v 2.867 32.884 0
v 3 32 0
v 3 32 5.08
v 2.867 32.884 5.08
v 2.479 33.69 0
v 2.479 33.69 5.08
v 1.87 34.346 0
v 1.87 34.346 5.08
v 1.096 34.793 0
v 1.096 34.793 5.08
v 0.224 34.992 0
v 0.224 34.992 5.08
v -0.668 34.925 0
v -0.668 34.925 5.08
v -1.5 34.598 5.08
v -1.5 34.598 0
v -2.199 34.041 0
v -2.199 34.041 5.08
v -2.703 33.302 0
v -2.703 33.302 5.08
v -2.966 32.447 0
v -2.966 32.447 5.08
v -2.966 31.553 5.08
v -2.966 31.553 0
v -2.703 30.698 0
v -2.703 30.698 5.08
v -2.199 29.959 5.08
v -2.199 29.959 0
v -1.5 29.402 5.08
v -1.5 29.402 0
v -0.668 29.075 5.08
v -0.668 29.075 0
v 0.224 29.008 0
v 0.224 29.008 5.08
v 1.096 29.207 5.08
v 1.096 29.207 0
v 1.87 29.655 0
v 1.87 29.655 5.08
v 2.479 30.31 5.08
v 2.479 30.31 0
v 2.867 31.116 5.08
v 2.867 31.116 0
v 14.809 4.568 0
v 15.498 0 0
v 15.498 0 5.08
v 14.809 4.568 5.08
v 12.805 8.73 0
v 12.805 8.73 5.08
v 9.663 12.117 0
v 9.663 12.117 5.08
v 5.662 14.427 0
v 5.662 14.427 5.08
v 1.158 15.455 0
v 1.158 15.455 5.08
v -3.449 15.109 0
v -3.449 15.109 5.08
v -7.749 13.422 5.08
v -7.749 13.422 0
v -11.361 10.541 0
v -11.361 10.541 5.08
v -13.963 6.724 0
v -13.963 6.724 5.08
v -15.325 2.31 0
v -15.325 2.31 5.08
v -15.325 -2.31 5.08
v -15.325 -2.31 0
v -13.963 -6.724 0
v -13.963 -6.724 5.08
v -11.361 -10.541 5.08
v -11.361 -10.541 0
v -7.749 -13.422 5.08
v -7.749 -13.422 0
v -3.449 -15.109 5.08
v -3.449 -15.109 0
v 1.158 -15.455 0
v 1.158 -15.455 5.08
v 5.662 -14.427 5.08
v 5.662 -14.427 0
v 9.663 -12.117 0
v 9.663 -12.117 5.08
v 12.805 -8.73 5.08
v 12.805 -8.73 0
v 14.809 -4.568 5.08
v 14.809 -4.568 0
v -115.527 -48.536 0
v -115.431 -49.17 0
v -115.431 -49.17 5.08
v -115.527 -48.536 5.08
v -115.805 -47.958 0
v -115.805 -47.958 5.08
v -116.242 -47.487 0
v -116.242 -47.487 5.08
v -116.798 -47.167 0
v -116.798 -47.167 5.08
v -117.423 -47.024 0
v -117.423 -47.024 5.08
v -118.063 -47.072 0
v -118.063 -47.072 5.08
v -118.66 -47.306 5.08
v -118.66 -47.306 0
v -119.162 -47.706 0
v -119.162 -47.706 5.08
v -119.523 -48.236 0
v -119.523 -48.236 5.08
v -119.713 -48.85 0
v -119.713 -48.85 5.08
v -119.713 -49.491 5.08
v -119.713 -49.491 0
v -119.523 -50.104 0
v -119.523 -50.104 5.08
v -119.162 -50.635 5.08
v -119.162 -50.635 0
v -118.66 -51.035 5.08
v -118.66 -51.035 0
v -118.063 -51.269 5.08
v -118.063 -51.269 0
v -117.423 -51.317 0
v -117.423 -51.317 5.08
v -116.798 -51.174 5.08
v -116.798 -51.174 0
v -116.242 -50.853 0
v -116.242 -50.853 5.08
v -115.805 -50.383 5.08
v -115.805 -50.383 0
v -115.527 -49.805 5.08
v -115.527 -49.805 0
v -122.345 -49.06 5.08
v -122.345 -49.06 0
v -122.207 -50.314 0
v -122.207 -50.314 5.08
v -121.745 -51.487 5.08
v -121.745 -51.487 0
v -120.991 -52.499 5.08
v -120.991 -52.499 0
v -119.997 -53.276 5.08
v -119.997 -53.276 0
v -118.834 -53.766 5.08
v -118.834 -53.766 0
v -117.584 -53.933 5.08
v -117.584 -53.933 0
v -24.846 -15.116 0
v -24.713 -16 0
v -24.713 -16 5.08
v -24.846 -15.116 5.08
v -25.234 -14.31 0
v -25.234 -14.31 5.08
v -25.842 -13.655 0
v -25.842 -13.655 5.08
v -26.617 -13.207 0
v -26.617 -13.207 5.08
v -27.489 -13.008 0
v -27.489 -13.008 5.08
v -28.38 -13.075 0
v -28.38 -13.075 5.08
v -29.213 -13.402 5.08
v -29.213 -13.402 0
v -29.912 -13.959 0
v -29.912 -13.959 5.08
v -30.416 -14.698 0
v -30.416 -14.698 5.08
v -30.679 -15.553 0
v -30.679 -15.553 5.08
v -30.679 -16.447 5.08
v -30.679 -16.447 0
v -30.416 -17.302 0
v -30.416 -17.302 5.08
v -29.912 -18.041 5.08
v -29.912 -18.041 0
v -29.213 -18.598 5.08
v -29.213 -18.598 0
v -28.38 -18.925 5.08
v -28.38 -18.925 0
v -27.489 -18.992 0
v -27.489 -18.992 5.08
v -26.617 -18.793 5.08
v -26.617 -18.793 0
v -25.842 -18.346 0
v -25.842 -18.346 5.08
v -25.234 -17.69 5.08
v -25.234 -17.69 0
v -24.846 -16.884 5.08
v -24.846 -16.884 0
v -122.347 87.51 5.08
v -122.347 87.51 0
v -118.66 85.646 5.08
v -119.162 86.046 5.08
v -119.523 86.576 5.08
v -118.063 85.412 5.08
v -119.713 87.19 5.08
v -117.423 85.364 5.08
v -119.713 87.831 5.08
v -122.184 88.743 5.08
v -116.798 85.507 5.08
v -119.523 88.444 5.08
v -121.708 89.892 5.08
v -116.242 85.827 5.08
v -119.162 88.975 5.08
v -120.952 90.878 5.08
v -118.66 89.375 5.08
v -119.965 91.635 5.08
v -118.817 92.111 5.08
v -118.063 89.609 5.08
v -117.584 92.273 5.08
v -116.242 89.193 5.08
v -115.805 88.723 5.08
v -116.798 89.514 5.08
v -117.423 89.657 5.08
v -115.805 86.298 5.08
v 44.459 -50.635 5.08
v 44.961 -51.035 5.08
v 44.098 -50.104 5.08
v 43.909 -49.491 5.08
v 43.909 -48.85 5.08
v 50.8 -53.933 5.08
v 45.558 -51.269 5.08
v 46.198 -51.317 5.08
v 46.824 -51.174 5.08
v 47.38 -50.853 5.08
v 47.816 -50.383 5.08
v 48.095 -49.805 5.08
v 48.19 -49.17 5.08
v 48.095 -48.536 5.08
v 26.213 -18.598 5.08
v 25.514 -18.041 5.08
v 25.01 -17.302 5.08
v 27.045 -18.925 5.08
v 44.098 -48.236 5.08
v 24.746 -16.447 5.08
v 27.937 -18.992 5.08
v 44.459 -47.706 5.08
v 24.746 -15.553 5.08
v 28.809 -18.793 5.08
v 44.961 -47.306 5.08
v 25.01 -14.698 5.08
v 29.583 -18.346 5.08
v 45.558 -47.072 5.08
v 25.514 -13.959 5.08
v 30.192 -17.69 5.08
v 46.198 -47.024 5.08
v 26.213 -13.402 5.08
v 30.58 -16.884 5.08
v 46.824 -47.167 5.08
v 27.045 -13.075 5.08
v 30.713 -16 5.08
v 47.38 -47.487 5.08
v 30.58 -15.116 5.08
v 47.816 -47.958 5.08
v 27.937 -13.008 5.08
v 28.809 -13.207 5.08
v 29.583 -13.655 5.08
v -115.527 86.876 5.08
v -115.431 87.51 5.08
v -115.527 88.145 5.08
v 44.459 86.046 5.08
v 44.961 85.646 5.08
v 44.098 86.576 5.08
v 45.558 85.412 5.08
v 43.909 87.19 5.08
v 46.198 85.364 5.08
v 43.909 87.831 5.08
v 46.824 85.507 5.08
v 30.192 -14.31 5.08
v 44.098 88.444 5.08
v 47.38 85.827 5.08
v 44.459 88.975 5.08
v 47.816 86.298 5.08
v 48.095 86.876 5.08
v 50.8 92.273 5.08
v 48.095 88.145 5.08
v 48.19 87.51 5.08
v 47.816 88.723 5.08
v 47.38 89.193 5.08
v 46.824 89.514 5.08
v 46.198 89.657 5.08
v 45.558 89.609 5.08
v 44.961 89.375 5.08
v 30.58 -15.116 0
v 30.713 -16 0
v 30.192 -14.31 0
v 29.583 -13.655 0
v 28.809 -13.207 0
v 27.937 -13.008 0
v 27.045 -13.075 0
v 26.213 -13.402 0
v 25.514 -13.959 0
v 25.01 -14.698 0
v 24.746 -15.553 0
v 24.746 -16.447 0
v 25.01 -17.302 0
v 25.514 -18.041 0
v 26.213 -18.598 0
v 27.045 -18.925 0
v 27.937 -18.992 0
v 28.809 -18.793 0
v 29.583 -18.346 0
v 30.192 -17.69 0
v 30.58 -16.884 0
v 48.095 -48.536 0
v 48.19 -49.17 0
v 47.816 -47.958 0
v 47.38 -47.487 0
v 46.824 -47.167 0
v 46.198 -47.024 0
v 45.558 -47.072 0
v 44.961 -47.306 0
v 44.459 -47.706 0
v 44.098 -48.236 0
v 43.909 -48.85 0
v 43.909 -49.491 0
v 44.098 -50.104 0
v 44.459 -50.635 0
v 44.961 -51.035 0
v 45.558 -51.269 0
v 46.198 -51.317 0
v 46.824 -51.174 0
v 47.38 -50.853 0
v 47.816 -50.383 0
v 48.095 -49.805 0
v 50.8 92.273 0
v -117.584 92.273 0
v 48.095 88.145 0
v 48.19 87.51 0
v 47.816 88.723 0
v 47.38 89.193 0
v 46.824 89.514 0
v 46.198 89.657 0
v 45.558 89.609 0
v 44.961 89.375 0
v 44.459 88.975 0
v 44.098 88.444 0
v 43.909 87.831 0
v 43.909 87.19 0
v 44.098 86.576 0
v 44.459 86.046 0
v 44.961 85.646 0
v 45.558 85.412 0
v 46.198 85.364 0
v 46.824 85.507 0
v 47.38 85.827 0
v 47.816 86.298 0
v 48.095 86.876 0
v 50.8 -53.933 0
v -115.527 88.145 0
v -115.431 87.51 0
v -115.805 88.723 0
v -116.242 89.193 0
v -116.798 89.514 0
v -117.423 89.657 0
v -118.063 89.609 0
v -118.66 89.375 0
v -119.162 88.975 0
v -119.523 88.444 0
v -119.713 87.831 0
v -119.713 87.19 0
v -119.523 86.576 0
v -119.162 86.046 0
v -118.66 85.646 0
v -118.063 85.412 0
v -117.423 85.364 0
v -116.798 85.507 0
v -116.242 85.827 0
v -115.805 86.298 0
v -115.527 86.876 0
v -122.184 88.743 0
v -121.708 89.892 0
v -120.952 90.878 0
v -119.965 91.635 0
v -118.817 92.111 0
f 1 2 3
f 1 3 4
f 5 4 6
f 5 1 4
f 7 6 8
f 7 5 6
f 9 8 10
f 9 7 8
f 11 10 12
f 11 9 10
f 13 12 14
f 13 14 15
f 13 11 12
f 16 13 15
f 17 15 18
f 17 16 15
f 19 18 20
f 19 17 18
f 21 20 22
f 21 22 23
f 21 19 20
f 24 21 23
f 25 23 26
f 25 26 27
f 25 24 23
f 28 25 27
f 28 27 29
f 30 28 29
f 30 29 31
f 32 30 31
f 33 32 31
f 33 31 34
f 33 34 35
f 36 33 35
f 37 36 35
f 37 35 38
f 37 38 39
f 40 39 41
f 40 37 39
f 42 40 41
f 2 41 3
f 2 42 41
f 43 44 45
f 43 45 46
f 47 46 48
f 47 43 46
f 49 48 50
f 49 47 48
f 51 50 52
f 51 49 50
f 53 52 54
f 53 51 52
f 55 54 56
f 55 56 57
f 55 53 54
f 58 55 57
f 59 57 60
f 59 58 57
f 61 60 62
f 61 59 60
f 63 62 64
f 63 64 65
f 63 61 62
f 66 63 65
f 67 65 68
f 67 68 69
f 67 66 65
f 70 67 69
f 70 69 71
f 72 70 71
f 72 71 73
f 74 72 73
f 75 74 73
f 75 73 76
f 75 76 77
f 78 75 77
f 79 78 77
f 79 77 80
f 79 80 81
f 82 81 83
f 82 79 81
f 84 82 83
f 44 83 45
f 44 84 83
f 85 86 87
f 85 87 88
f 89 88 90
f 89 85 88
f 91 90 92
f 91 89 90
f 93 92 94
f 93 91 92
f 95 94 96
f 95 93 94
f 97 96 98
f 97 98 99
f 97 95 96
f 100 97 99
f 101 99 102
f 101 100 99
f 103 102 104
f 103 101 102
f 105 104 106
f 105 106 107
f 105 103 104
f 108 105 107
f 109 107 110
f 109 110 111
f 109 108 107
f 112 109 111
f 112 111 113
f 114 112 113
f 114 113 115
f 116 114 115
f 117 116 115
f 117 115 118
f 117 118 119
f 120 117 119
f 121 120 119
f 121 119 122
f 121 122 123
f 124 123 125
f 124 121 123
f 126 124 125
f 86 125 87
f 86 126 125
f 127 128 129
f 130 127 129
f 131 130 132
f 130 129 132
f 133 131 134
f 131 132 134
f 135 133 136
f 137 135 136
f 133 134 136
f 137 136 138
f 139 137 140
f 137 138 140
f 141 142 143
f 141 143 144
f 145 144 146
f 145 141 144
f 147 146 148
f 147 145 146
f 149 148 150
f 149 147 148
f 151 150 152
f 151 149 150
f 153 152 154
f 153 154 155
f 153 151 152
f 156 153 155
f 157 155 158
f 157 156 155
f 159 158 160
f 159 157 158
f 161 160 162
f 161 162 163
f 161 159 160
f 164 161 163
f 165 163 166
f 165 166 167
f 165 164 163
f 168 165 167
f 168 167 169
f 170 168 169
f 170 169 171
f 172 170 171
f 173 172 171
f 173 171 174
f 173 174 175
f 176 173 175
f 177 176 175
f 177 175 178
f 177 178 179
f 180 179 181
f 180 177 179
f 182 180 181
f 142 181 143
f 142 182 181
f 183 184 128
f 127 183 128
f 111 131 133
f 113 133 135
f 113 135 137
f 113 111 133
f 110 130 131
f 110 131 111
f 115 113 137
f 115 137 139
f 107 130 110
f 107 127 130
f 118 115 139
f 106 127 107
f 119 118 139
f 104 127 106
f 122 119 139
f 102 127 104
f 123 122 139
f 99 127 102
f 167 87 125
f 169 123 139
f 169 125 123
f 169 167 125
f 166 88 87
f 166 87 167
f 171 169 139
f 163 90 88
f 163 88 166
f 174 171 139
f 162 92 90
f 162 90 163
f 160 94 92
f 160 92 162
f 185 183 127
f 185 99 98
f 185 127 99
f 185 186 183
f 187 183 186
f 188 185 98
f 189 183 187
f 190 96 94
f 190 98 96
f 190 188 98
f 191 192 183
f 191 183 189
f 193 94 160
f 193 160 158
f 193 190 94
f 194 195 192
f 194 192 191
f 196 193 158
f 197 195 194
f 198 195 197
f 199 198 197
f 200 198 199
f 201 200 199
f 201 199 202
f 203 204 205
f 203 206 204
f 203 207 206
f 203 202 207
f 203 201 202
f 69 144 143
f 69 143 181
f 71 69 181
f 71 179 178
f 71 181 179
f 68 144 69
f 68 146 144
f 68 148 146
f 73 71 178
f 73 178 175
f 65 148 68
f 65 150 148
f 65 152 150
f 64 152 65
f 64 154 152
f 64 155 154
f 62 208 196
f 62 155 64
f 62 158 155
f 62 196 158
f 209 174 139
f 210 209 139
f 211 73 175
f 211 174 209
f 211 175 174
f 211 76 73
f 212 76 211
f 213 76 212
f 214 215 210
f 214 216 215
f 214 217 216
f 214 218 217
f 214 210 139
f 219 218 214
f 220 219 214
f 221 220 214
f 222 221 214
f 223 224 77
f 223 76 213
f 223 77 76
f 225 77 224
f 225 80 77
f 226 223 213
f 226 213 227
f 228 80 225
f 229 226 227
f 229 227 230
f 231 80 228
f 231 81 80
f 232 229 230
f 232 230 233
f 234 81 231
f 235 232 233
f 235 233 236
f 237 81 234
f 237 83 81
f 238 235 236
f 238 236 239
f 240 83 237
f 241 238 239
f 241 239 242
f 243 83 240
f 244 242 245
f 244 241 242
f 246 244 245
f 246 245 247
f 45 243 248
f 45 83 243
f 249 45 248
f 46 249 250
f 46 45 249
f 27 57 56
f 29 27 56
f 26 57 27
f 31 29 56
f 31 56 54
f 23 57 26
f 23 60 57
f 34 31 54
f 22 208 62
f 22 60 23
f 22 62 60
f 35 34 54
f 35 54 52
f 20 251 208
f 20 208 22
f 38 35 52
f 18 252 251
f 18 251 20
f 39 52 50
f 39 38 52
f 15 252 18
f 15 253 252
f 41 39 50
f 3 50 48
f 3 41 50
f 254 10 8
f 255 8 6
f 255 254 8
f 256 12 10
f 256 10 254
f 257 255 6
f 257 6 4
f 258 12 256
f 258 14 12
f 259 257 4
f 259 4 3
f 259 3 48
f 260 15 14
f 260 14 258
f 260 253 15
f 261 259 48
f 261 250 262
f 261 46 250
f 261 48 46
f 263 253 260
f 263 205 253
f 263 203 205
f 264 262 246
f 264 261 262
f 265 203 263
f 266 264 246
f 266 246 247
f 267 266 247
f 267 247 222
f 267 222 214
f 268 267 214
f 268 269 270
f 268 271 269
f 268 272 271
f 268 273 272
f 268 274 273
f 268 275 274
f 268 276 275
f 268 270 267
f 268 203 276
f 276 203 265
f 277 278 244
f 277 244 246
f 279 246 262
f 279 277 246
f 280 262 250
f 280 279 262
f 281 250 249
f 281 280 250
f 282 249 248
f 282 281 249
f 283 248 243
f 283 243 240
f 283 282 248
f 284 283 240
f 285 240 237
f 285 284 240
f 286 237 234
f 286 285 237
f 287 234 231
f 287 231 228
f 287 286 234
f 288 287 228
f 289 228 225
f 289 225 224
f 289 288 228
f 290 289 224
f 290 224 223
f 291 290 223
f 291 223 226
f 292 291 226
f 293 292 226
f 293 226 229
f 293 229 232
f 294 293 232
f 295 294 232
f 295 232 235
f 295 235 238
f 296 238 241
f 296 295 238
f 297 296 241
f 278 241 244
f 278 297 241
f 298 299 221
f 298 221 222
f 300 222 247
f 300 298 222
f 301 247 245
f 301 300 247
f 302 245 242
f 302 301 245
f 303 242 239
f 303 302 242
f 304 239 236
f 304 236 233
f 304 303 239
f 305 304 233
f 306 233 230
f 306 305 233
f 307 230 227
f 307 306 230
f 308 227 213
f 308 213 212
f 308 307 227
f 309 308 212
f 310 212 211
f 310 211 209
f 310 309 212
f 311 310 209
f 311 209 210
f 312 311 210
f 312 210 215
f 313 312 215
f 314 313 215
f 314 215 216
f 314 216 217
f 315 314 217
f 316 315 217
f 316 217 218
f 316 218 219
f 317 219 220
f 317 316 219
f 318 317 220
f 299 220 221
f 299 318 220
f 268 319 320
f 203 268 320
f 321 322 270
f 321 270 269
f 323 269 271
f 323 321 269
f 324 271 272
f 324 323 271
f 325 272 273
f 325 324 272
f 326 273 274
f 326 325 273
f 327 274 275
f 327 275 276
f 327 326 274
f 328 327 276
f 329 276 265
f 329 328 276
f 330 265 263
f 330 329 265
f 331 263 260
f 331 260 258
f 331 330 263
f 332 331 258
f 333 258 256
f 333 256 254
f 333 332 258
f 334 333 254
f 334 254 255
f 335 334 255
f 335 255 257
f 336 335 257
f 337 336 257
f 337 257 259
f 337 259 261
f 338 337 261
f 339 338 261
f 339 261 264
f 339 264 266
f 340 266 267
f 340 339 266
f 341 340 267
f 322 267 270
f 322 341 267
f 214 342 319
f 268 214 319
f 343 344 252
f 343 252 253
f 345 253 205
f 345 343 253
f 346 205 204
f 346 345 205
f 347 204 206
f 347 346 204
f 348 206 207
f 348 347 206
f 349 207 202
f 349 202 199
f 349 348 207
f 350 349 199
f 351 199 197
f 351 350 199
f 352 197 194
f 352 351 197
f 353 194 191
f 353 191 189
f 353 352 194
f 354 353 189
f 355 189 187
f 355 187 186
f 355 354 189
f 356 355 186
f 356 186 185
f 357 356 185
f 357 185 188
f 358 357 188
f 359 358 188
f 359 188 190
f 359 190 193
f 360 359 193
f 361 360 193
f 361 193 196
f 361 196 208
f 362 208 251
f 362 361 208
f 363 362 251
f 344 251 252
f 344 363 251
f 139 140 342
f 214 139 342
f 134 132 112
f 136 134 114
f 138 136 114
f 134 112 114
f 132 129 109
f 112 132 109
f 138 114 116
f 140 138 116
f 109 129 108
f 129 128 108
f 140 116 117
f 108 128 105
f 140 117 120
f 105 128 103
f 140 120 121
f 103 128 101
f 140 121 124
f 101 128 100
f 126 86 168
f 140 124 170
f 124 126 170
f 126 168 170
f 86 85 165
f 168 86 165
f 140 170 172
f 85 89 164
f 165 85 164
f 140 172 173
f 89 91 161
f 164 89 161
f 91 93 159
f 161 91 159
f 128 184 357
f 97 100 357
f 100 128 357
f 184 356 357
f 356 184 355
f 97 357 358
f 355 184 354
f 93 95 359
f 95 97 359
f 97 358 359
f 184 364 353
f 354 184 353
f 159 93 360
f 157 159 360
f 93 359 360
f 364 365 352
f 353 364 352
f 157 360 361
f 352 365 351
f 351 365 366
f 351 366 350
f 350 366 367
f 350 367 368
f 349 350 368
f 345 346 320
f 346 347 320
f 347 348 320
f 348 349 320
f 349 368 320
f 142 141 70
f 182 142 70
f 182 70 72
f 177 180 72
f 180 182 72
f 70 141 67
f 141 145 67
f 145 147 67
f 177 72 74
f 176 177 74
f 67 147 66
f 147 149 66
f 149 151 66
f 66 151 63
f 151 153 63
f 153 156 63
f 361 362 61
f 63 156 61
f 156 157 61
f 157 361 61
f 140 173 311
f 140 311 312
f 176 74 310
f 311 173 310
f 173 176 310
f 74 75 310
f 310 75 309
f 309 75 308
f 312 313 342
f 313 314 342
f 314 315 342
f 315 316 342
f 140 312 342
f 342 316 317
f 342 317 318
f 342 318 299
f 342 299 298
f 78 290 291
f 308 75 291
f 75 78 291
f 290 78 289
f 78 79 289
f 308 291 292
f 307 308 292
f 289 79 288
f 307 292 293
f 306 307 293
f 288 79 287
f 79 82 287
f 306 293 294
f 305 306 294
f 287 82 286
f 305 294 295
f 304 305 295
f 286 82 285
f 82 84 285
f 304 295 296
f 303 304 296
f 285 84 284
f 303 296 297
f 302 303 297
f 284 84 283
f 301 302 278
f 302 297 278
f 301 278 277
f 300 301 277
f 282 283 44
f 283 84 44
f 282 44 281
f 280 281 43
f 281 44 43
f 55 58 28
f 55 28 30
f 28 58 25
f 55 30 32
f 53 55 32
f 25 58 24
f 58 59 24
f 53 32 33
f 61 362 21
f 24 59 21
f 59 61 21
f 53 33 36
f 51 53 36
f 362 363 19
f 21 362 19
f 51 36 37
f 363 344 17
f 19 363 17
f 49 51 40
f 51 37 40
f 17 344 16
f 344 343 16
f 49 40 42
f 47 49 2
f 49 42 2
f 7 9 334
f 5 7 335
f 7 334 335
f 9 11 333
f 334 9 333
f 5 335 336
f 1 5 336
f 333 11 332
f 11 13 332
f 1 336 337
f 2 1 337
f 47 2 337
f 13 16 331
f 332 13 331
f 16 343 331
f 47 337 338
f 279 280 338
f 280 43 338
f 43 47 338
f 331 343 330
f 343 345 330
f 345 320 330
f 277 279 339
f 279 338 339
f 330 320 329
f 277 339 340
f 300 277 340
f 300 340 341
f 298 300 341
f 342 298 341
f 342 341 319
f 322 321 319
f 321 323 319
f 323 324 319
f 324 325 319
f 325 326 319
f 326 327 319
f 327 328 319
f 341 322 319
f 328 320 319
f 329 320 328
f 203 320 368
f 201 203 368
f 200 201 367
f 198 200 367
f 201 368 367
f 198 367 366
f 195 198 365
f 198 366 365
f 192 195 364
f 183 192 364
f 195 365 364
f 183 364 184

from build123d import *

# Parameters (mm, degrees)
F0_R     = 2.15265
F0_R_2   = 3
F0_R_3   = 15.497899
F1_DEPTH = 5.08


with BuildPart() as f1:
    # F0 (on Top) → F1 (new body)
    with BuildSketch(Plane.XY):
        with BuildLine():
            Line((50.8, 92.272936), (-117.584017, 92.272936))
            ThreePointArc((-117.584017, 92.272936), (-120.951629, 90.878016), (-122.346517, 87.510391))
            Line((-122.346517, 87.510391), (-122.345227, -49.059594))
            ThreePointArc((-122.345227, -49.059594), (-120.990568, -52.498598), (-117.584017, -53.932913))
            Line((-117.584017, -53.932913), (50.8, -53.932913))
            Line((50.8, -53.932913), (50.8, 92.272936))
        make_face()
        with Locations((-117.584017, -49.170413)):
            Circle(F0_R, mode=Mode.SUBTRACT)
        with Locations((46.0375, -49.170413)):
            Circle(F0_R, mode=Mode.SUBTRACT)
        with Locations((-27.712823, -16.000006)):
            Circle(F0_R_2, mode=Mode.SUBTRACT)
        Circle(F0_R_3, mode=Mode.SUBTRACT)
        with Locations((27.712823, -16.000006)):
            Circle(F0_R_2, mode=Mode.SUBTRACT)
        with Locations((-117.584017, 87.510436)):
            Circle(F0_R, mode=Mode.SUBTRACT)
        with Locations((0, 32.000012)):
            Circle(F0_R_2, mode=Mode.SUBTRACT)
        with Locations((46.0375, 87.510436)):
            Circle(F0_R, mode=Mode.SUBTRACT)
    extrude(amount=F1_DEPTH)


solid = f1.part
